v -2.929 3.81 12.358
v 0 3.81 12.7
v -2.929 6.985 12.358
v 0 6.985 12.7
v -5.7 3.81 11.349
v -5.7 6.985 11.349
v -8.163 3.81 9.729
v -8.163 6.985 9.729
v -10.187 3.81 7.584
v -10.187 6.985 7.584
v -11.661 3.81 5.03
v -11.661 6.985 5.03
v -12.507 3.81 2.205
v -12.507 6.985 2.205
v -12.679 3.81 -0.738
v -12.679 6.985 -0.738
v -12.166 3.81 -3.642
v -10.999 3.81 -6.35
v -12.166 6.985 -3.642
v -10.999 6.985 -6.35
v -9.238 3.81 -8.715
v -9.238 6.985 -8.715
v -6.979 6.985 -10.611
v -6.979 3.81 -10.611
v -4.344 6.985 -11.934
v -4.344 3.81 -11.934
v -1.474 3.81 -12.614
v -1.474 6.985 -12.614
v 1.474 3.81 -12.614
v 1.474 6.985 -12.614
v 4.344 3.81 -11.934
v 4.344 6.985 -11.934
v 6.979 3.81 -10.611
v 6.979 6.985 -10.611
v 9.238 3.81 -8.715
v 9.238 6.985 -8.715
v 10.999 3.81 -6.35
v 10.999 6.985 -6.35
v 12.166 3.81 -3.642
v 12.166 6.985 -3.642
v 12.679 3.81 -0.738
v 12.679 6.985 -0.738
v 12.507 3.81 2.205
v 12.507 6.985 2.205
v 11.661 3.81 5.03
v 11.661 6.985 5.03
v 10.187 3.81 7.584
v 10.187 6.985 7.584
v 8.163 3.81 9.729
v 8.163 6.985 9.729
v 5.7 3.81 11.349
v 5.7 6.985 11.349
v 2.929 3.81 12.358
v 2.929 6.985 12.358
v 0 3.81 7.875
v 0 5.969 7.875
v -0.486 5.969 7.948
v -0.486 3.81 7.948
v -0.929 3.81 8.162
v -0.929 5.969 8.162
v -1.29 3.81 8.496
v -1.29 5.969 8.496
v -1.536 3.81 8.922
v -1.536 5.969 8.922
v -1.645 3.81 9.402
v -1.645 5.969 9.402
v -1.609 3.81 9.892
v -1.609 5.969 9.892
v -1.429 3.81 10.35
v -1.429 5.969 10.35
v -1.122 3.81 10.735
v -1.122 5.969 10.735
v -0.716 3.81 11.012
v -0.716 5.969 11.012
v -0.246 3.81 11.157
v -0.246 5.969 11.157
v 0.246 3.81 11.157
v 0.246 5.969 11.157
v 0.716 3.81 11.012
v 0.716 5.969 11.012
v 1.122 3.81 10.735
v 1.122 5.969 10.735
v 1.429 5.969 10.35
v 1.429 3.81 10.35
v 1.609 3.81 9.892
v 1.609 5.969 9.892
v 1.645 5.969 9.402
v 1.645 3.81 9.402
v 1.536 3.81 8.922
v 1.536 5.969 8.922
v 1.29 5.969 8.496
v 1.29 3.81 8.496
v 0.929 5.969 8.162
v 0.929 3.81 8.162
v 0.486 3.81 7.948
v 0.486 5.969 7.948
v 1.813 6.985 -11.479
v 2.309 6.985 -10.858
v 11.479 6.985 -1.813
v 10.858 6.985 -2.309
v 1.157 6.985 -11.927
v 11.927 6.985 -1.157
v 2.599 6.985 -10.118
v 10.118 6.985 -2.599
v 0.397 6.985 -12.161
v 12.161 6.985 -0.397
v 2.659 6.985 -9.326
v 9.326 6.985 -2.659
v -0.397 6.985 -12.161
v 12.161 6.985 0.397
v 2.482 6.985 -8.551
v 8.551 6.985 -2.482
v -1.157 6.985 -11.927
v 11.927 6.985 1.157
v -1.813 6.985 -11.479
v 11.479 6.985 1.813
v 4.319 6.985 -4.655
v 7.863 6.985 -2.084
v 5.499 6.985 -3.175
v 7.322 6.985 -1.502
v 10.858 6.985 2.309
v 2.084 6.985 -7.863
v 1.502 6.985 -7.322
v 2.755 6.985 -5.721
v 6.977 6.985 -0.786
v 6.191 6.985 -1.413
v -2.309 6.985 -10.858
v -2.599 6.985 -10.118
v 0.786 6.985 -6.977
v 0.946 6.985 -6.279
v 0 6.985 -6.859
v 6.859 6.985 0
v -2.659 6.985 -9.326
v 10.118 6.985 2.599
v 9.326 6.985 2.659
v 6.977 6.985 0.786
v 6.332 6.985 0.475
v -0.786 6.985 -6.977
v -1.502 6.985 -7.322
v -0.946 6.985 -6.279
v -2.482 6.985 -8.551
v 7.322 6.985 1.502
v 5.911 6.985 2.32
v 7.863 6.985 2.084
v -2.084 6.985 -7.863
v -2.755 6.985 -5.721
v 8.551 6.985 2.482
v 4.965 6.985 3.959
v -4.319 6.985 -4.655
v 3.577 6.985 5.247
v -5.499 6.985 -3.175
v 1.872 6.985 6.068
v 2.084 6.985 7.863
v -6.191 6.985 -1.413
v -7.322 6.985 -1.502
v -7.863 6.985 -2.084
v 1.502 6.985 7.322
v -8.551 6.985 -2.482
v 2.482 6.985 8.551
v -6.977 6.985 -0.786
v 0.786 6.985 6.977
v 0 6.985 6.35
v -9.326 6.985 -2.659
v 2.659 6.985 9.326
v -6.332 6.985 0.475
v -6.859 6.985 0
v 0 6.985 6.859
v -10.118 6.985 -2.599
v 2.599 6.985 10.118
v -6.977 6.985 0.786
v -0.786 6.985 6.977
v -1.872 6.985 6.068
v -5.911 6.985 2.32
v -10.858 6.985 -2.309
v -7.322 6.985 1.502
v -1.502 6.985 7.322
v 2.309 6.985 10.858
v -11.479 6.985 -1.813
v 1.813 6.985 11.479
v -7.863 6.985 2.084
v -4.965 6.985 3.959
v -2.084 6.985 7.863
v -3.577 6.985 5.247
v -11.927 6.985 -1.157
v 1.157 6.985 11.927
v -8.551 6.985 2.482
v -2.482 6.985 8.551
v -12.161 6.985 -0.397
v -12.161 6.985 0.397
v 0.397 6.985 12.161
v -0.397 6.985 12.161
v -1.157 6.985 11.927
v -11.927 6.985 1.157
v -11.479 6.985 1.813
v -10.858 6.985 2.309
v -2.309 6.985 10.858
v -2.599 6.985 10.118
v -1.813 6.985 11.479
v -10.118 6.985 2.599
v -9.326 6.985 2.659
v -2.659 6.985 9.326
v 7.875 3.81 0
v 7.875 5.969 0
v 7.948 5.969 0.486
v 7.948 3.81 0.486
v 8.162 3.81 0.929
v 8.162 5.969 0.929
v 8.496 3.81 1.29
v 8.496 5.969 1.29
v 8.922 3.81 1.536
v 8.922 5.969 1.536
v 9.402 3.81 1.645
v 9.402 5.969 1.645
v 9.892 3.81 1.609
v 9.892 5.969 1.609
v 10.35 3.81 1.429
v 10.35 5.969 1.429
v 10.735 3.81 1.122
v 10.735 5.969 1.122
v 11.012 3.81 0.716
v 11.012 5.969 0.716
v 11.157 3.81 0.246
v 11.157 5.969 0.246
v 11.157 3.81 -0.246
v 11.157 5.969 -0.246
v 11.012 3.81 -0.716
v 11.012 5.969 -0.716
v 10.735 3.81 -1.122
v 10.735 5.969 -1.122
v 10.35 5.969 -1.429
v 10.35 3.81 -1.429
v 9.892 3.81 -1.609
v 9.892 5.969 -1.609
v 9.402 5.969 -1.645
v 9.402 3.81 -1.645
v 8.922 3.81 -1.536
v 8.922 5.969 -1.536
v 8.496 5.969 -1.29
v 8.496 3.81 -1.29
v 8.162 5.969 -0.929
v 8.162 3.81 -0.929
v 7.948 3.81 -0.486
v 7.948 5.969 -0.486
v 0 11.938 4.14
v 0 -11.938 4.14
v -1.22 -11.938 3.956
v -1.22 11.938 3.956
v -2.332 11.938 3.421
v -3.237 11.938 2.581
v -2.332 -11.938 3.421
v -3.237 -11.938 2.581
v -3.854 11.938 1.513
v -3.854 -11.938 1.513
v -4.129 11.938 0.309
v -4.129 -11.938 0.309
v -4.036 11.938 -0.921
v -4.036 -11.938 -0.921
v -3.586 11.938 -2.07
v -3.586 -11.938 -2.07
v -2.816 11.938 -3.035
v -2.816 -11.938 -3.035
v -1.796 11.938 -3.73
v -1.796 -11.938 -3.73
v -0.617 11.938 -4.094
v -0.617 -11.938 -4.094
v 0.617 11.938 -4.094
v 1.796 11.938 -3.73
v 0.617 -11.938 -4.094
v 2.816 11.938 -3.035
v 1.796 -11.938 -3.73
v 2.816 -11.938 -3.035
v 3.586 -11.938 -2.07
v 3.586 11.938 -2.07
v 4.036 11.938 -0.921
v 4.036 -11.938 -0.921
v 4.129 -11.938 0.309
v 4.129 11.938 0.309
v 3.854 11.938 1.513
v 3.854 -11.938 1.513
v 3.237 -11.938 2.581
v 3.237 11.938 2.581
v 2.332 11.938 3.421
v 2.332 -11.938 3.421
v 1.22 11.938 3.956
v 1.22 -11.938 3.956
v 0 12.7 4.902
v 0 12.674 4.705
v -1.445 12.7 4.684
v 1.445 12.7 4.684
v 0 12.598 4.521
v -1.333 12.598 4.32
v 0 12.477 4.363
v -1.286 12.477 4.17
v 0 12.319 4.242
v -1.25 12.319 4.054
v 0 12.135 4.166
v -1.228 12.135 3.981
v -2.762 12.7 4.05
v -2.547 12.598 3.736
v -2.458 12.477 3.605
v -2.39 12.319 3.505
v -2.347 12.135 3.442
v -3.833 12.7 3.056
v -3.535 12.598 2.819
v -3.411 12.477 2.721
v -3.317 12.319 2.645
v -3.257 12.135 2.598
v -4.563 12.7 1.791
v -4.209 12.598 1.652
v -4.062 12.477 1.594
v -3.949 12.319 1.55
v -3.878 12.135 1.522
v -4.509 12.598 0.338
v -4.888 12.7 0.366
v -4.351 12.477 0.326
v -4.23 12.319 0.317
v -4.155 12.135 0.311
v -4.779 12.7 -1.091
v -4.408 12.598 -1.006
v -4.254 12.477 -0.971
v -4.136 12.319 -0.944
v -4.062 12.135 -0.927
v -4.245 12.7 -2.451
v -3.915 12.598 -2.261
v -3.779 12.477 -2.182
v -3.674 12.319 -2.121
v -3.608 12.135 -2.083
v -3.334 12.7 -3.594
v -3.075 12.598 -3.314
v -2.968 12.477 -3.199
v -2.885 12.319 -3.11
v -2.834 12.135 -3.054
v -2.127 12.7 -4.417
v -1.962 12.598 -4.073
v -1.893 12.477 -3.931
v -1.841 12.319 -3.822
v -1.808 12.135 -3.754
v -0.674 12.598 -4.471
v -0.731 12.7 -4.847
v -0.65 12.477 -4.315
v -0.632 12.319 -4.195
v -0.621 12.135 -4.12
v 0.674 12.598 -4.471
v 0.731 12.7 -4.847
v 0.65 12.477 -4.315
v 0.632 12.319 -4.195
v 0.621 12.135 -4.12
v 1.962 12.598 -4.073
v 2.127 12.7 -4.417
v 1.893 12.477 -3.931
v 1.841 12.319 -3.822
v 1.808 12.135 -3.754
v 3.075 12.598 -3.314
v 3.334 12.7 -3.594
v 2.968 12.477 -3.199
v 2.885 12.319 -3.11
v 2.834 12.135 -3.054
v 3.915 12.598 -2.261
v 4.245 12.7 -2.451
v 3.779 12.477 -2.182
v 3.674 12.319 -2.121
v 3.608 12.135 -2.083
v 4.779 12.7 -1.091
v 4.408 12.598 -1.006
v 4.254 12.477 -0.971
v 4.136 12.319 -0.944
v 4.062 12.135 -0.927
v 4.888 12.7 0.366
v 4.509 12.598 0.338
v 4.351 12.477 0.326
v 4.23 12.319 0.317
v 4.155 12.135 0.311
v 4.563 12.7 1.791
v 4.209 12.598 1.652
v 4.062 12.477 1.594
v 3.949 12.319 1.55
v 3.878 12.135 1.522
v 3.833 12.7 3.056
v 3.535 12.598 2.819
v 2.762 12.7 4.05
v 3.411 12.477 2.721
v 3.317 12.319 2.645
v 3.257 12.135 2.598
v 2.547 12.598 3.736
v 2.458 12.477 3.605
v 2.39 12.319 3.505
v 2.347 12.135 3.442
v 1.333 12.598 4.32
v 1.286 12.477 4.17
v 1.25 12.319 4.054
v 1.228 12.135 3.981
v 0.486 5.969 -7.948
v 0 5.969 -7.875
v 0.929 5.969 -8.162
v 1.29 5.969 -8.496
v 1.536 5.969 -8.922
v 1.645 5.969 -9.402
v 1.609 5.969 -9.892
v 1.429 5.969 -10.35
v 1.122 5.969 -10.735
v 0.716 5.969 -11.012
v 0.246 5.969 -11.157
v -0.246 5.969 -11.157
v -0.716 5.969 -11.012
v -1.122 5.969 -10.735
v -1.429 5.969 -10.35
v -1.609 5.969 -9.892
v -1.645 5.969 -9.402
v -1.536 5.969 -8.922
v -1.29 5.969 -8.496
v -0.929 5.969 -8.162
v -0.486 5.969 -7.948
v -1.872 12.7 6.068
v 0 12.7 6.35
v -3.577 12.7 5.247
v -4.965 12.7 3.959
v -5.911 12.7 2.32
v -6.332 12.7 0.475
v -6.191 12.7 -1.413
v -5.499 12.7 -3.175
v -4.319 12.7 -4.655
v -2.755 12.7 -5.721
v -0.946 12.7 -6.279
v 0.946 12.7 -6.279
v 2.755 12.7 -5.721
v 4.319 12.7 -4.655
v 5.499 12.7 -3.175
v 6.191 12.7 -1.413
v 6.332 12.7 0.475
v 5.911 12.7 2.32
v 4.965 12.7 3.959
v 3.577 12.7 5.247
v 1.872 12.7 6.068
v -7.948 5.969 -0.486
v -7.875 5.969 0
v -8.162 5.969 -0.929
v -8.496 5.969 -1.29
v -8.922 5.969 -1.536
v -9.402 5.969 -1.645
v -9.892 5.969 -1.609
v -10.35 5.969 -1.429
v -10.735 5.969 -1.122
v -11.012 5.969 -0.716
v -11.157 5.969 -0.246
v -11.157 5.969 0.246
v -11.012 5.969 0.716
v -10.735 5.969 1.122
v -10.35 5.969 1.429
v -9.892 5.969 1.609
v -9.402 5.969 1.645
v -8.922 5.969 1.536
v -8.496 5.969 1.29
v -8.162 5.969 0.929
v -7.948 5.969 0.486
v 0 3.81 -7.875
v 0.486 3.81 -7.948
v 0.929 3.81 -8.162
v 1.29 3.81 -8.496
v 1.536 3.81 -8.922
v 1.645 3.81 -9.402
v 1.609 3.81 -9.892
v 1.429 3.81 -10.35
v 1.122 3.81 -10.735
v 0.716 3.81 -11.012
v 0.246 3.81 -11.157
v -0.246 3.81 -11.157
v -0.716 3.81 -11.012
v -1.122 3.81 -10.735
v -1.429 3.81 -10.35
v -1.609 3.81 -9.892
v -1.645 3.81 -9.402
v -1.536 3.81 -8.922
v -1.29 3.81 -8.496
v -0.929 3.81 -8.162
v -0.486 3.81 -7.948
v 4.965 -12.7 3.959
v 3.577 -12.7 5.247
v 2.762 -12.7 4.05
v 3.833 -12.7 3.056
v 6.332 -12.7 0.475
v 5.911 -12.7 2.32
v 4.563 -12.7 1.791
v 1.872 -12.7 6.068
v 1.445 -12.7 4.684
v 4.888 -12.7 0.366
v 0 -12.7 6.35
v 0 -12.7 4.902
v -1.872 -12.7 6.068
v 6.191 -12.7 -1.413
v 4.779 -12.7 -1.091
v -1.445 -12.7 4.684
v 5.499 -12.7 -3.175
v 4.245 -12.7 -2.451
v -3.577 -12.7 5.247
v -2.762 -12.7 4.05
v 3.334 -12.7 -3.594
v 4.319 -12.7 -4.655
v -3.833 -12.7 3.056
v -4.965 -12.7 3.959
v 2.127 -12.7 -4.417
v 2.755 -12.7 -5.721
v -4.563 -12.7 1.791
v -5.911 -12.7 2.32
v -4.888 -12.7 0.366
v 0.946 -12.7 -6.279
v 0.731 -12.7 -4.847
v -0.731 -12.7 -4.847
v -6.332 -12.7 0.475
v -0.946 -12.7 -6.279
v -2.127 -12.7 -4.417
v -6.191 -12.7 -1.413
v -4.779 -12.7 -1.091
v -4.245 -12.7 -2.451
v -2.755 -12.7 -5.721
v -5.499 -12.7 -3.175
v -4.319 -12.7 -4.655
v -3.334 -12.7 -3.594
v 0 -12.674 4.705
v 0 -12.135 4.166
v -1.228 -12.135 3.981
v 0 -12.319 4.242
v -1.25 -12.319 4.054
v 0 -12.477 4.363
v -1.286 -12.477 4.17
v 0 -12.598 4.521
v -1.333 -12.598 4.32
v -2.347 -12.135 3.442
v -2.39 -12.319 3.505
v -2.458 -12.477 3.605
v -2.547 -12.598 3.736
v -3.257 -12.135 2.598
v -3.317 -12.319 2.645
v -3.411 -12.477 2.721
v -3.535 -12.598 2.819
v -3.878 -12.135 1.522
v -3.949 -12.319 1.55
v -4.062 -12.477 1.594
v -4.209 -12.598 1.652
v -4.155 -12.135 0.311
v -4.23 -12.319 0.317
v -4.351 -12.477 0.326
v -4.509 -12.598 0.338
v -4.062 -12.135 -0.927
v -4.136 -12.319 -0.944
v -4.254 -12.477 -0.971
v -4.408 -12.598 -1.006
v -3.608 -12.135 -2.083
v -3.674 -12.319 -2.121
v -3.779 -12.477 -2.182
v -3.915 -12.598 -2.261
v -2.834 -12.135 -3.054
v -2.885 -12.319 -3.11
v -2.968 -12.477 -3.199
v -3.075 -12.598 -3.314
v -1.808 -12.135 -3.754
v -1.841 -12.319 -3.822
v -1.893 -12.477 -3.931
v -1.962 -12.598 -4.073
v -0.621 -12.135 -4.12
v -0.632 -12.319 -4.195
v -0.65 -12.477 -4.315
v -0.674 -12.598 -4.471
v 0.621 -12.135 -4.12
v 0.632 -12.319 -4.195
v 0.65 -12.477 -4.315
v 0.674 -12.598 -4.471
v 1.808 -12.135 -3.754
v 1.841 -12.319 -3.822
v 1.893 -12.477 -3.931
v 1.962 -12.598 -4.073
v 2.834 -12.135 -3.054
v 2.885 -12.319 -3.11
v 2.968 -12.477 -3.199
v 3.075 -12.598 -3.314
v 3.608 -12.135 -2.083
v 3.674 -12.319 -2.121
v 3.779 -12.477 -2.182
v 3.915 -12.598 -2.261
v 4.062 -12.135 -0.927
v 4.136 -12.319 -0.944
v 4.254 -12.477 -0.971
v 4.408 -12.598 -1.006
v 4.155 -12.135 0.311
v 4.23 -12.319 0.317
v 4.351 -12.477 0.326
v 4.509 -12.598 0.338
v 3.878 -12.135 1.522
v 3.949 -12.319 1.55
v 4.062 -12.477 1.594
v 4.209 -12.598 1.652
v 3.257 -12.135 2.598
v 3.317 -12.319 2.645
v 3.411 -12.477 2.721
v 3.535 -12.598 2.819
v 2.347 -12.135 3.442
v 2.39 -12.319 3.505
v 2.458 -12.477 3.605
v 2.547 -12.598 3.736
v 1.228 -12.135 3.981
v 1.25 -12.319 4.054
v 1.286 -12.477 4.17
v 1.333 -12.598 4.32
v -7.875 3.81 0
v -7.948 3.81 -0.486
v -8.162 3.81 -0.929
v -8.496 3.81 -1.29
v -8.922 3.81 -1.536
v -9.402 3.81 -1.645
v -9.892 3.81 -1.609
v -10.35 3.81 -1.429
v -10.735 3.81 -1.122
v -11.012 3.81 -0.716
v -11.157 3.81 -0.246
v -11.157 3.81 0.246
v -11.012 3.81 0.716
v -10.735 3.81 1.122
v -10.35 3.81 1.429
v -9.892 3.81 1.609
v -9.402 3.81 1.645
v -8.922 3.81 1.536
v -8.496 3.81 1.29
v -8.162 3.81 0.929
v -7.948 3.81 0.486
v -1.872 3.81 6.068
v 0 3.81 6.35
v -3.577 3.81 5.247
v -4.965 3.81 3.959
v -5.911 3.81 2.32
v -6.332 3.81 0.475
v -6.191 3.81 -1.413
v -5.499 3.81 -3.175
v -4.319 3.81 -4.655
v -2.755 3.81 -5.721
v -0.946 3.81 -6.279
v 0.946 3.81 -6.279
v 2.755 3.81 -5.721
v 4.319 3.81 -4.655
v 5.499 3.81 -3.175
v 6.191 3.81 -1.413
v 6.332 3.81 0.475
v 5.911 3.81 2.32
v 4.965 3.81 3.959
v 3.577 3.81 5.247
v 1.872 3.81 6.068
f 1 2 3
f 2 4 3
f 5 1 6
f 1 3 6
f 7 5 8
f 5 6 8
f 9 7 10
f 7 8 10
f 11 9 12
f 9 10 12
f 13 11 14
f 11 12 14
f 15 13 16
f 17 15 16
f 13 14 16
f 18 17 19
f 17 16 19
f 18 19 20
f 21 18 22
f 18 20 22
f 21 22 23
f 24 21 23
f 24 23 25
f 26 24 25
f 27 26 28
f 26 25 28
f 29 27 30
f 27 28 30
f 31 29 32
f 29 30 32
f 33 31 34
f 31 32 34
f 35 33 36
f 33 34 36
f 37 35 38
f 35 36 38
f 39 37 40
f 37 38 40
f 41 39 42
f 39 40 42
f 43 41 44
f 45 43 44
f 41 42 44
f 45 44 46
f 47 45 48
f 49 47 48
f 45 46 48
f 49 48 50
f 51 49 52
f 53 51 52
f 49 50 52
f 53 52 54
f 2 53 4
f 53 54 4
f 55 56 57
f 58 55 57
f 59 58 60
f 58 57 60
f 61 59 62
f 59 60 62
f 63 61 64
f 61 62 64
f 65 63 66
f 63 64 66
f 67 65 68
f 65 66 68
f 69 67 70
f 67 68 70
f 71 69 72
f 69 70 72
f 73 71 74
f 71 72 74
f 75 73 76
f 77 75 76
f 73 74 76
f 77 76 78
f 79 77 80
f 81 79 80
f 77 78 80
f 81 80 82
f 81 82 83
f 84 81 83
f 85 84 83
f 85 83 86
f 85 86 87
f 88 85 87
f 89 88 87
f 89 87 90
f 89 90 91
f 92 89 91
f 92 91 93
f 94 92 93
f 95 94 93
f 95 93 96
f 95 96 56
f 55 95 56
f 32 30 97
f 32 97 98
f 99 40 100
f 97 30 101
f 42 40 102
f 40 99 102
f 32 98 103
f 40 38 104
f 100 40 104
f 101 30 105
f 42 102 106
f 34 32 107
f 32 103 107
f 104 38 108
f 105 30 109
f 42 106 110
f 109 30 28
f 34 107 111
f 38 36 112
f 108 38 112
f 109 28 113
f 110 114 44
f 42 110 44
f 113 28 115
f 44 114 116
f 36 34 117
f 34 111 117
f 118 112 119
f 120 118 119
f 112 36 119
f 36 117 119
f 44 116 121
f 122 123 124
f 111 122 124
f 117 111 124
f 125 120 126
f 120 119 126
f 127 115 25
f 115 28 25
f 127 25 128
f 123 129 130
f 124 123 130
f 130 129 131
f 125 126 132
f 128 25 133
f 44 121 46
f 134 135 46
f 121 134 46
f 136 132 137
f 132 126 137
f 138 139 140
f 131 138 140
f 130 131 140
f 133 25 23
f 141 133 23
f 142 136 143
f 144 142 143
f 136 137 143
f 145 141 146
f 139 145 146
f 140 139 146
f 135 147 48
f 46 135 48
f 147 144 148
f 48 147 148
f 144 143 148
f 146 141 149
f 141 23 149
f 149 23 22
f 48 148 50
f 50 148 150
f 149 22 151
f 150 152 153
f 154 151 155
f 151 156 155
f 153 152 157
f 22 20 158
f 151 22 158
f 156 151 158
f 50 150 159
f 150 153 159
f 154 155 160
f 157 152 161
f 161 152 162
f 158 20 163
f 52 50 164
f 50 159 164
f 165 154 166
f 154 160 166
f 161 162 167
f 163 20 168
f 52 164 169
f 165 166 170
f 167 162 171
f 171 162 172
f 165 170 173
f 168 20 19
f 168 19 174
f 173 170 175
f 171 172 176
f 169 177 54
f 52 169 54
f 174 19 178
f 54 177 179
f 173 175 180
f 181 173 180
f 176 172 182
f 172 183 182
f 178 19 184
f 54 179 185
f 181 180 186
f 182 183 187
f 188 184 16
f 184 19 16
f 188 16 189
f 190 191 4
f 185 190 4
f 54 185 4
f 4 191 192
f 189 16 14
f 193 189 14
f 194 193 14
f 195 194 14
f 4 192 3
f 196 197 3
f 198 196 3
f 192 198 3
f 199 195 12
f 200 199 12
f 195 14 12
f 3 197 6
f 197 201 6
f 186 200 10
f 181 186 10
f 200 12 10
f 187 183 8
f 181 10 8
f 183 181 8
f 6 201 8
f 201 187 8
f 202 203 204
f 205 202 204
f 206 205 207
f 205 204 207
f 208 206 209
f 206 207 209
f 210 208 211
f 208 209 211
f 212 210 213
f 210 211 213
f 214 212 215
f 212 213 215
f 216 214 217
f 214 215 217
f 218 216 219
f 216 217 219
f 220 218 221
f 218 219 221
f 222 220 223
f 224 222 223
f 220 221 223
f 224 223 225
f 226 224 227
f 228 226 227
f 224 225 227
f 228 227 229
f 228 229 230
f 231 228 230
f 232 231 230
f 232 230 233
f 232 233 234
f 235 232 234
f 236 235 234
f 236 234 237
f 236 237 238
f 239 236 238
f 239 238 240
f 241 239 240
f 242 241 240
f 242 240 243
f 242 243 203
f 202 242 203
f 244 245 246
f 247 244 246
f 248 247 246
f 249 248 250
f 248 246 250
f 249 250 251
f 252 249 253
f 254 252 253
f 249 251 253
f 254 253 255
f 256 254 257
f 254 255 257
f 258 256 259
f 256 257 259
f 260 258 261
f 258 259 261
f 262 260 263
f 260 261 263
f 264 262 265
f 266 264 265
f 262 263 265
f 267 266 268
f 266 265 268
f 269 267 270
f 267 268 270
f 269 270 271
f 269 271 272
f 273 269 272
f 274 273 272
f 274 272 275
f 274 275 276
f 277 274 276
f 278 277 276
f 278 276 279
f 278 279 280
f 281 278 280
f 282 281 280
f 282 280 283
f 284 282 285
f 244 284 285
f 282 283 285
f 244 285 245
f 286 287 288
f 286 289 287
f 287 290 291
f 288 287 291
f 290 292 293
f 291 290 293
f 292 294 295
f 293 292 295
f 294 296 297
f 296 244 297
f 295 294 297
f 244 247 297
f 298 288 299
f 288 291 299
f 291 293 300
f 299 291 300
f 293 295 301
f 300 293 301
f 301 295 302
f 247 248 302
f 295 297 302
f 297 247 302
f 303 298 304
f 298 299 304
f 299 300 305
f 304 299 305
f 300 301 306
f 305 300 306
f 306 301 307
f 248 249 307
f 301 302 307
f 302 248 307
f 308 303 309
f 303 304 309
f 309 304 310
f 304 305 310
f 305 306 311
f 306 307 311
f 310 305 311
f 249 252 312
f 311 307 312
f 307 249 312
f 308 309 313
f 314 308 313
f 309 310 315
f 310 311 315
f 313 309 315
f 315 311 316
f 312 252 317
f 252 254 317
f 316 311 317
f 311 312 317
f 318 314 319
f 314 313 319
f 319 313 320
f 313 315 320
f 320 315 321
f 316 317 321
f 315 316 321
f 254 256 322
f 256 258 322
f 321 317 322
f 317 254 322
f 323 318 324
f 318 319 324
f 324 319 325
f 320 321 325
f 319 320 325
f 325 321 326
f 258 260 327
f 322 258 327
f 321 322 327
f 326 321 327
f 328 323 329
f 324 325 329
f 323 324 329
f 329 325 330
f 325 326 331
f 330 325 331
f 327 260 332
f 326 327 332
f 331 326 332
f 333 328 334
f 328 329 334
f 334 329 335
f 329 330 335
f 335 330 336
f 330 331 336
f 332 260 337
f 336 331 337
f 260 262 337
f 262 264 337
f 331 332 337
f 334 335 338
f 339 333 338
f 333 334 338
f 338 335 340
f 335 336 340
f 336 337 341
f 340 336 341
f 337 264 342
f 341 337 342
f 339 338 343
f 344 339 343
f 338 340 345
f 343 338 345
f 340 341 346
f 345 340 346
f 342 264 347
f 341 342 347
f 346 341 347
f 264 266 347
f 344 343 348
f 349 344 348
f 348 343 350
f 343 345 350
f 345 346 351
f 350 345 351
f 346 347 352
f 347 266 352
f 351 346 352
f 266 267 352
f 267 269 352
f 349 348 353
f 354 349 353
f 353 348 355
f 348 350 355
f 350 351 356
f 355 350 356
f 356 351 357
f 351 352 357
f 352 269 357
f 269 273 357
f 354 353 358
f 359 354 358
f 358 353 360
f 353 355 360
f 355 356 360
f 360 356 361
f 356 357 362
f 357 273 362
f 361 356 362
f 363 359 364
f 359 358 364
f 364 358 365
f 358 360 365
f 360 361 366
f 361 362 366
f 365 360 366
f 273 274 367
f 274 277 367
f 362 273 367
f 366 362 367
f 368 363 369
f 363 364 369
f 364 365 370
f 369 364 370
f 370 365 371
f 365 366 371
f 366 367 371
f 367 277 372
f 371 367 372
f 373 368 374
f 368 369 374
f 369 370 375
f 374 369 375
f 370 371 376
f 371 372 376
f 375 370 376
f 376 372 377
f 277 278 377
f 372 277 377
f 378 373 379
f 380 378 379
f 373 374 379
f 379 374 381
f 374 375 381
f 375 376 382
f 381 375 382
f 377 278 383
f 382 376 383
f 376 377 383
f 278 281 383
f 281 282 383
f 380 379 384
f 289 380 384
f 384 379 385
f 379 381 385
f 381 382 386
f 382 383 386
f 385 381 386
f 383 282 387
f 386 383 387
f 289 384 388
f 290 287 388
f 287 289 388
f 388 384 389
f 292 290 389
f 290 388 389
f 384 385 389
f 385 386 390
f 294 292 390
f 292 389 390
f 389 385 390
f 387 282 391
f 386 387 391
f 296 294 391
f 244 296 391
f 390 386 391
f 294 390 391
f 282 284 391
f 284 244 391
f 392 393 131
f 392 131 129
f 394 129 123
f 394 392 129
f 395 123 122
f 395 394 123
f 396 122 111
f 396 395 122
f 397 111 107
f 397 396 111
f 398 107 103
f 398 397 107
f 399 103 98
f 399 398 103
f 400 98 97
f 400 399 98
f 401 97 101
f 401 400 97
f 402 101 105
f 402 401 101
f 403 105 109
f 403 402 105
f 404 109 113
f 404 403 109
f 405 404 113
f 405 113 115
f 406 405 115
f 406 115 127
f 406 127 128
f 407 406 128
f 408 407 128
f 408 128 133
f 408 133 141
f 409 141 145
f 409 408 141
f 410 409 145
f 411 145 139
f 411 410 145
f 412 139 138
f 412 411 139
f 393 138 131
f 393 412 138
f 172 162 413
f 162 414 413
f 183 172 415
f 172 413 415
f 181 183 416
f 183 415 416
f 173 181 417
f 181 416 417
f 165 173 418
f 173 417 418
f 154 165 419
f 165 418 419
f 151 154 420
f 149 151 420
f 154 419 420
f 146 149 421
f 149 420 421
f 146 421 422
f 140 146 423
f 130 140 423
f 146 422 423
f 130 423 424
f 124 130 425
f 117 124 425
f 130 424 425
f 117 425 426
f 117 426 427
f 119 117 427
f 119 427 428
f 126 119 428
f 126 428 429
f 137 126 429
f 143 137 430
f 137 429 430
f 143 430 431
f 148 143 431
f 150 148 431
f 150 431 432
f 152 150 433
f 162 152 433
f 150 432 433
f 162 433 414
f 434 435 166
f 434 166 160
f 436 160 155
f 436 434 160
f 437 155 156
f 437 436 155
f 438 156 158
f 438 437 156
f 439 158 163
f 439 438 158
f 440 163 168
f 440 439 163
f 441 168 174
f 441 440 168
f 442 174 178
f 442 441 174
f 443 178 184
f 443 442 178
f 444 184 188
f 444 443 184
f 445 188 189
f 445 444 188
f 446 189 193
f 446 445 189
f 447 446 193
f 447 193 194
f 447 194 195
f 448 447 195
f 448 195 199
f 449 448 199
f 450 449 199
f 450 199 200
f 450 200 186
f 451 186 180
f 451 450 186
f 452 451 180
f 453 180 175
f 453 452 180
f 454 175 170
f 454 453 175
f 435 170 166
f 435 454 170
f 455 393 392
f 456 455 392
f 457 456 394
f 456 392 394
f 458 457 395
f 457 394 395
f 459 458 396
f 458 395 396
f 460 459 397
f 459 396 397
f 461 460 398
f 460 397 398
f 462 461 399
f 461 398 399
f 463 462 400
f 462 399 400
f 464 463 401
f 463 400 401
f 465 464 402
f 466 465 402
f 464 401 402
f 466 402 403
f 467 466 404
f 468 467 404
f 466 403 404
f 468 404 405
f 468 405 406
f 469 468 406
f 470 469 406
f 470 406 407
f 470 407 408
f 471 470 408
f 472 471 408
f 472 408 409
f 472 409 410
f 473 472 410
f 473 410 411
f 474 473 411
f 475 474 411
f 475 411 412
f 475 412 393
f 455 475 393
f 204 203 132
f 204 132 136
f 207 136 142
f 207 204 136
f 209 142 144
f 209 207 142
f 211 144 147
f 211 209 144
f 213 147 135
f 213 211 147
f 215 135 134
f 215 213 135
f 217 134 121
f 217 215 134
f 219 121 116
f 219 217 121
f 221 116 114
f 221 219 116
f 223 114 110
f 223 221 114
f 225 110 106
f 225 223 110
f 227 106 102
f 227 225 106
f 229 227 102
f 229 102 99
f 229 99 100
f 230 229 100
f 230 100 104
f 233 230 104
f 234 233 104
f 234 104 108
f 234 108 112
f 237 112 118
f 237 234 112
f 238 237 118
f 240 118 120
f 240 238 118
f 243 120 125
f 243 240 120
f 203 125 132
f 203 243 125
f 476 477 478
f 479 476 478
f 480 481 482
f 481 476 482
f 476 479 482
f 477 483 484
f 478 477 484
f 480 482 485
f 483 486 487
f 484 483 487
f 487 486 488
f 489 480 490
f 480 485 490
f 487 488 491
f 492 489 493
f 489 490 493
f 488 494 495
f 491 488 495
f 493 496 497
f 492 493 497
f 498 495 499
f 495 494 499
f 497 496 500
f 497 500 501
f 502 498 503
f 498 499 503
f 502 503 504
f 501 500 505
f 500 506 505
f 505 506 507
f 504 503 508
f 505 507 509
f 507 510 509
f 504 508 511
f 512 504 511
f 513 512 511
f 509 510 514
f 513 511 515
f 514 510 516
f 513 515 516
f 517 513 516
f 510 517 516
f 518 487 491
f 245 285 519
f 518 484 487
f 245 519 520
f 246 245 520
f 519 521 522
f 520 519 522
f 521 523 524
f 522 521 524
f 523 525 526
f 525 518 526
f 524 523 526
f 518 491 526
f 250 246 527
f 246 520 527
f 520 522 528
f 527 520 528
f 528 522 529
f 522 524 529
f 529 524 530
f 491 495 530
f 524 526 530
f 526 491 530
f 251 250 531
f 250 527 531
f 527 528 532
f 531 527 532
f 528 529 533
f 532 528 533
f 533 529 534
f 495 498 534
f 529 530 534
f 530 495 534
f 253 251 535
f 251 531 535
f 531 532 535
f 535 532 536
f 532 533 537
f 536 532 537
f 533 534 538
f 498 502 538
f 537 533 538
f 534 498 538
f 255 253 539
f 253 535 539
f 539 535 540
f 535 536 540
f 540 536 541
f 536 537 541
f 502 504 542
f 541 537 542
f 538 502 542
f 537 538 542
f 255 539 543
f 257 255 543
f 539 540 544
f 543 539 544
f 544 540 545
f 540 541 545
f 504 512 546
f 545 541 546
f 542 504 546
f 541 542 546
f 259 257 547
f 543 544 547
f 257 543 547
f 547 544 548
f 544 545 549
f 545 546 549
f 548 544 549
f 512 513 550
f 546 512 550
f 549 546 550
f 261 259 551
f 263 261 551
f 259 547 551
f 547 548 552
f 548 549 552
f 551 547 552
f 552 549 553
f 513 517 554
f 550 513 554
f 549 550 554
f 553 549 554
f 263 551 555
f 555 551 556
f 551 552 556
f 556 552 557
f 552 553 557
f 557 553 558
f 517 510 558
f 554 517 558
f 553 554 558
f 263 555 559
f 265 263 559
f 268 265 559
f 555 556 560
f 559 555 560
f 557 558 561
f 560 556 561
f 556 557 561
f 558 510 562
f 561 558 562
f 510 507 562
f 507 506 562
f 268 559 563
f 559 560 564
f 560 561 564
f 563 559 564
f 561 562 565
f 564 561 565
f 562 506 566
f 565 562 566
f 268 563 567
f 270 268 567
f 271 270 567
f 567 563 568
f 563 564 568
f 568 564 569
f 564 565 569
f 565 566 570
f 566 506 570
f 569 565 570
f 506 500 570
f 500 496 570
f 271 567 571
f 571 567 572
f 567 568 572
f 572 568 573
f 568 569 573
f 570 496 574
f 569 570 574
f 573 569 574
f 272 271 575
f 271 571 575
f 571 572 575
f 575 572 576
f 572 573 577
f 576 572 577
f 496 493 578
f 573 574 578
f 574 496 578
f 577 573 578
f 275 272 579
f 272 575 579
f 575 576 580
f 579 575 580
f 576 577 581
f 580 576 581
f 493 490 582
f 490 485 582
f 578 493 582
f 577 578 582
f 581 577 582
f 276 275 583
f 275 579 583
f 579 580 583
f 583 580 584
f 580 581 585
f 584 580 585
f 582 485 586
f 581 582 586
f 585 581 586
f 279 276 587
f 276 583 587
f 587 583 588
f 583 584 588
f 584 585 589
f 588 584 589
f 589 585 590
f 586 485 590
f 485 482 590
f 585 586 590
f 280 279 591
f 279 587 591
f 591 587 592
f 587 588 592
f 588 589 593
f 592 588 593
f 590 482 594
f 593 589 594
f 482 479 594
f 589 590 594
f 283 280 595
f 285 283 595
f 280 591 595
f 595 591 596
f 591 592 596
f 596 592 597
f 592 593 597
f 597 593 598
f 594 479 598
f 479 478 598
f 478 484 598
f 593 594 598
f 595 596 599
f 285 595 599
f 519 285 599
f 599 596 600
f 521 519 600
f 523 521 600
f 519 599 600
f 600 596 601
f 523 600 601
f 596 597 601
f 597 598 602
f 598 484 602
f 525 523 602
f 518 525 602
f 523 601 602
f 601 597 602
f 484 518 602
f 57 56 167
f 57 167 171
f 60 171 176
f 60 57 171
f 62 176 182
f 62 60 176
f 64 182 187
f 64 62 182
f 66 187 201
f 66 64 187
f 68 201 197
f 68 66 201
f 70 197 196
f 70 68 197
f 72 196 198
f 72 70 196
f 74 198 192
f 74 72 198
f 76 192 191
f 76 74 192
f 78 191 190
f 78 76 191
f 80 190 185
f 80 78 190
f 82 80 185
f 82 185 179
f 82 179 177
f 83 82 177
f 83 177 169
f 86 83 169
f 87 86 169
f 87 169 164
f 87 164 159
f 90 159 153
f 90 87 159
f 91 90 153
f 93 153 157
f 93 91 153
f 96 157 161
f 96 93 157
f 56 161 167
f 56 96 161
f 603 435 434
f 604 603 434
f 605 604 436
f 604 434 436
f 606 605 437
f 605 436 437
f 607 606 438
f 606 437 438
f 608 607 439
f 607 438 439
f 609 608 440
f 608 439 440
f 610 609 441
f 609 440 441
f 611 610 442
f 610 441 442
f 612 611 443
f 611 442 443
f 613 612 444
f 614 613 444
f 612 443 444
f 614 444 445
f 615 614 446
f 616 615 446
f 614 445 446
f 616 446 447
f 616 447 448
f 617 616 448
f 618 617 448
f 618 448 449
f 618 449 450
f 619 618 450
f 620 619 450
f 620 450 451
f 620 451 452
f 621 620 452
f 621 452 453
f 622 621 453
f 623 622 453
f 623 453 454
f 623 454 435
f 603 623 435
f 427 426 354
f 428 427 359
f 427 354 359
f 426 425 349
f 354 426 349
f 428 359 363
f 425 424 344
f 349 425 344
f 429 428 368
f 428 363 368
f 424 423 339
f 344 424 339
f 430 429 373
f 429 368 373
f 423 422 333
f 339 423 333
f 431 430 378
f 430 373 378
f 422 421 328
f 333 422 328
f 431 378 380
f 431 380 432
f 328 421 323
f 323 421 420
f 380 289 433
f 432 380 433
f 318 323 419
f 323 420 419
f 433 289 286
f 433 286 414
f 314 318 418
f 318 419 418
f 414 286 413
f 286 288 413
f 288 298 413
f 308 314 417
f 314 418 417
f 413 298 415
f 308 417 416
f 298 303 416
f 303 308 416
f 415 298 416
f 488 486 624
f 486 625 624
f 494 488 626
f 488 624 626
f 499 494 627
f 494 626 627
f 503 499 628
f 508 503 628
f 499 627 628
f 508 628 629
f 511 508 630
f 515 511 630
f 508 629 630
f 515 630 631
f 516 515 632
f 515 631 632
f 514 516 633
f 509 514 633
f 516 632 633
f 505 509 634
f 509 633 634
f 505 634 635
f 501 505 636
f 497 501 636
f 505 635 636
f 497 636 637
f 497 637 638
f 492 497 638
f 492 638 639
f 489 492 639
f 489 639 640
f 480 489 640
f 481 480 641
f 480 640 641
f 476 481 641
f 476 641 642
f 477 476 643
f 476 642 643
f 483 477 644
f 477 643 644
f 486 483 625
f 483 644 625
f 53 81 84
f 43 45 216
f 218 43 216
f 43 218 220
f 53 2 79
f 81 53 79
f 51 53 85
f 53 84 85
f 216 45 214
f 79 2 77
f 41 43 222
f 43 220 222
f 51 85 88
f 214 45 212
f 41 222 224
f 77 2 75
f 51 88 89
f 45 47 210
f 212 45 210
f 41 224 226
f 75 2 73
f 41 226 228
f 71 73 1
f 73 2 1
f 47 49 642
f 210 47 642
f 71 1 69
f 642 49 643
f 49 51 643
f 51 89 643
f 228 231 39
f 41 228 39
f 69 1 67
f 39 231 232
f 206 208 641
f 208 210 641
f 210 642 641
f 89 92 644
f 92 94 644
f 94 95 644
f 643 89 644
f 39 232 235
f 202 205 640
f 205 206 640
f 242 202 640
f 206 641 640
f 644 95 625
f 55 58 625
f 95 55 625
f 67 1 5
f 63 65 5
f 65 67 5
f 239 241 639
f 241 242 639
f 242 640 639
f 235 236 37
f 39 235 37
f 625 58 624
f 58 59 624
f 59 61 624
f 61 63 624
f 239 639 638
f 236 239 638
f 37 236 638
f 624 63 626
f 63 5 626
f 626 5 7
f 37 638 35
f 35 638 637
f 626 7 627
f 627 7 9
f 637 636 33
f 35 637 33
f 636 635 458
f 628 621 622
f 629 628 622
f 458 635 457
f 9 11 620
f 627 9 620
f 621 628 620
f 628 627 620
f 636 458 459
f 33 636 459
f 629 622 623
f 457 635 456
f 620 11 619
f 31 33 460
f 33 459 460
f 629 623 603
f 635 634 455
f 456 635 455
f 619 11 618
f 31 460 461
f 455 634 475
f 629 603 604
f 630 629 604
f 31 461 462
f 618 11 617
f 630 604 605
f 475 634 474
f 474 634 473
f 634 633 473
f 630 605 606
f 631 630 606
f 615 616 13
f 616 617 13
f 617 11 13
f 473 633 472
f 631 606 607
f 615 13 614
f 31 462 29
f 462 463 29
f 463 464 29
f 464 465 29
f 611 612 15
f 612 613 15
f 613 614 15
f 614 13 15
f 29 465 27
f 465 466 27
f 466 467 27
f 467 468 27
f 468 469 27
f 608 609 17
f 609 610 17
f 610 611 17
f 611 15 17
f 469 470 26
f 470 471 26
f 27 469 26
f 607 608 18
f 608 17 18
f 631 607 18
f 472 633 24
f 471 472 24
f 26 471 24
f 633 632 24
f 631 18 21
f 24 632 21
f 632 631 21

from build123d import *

# Parameters (mm, degrees)
SKETCH2_R                    = 1.65
CUT_EXTRUDE1_DEPTH           = 27.647311778
CHAMFER1_SIZE                = 1.016
CIRPATTERN1_COUNT            = 4
CHAMFER1_OF_CIRPATTERN1_SIZE = 1.016
FILLET1_R                    = 0.762


with BuildPart() as part:
    # Sketch1 → Revolve1 (revolve)
    with BuildSketch(Plane.XY, mode=Mode.PRIVATE) as revolve1_sk:
        Polygon((4.1402, 12.7), (4.1402, -12.7), (6.35, -12.7), (6.35, 3.81), (12.7, 3.81), (12.7, 6.985), (6.35, 6.985), (6.35, 12.7), align=None)
    revolve(revolve1_sk.sketch.rotate(Axis((0, 0, 0), (0, -1, 0)), 90), axis=Axis((0, 0, 0), (0, -1, 0)))

    # Sketch2 → Cut-Extrude1 (cut, through all)
    with BuildSketch(Plane(origin=(0, 6.985, 0), x_dir=(1, 0, 0), z_dir=(0, 1, 0))):
        with Locations(Location((0, 9.525, 0), (0, 0, 270))):
            Circle(SKETCH2_R)
    cut_extrude1 = extrude(amount=-CUT_EXTRUDE1_DEPTH, mode=Mode.SUBTRACT)

    # Chamfer1
    chamfer1_edges = [part.edges().sort_by_distance(p)[0] for p in [
        (0, 6.985, -11.175),
    ]]
    chamfer(chamfer1_edges, length=CHAMFER1_SIZE)

    # CirPattern1: Cut-Extrude1 ×4 about axis
    cirpattern1_axis = Axis((0, 0, 0), (0, 1, 0))
    for i in range(1, CIRPATTERN1_COUNT):
        add(cut_extrude1.rotate(cirpattern1_axis, i * 360 / CIRPATTERN1_COUNT), mode=Mode.SUBTRACT)

    # Chamfer1 of CirPattern1
    chamfer1_of_cirpattern1_edges = [part.edges().sort_by_distance(p)[0] for p in [
        (-11.175, 6.985, 0),
        (0, 6.985, 11.175),
        (11.175, 6.985, 0),
    ]]
    chamfer(chamfer1_of_cirpattern1_edges, length=CHAMFER1_OF_CIRPATTERN1_SIZE)

    # Fillet1
    fillet1_edges = [part.edges().sort_by_distance(p)[0] for p in [
        (0, 12.7, -4.1402),
        (0, -12.7, -4.1402),
    ]]
    fillet(fillet1_edges, radius=FILLET1_R)


solid = part.part
